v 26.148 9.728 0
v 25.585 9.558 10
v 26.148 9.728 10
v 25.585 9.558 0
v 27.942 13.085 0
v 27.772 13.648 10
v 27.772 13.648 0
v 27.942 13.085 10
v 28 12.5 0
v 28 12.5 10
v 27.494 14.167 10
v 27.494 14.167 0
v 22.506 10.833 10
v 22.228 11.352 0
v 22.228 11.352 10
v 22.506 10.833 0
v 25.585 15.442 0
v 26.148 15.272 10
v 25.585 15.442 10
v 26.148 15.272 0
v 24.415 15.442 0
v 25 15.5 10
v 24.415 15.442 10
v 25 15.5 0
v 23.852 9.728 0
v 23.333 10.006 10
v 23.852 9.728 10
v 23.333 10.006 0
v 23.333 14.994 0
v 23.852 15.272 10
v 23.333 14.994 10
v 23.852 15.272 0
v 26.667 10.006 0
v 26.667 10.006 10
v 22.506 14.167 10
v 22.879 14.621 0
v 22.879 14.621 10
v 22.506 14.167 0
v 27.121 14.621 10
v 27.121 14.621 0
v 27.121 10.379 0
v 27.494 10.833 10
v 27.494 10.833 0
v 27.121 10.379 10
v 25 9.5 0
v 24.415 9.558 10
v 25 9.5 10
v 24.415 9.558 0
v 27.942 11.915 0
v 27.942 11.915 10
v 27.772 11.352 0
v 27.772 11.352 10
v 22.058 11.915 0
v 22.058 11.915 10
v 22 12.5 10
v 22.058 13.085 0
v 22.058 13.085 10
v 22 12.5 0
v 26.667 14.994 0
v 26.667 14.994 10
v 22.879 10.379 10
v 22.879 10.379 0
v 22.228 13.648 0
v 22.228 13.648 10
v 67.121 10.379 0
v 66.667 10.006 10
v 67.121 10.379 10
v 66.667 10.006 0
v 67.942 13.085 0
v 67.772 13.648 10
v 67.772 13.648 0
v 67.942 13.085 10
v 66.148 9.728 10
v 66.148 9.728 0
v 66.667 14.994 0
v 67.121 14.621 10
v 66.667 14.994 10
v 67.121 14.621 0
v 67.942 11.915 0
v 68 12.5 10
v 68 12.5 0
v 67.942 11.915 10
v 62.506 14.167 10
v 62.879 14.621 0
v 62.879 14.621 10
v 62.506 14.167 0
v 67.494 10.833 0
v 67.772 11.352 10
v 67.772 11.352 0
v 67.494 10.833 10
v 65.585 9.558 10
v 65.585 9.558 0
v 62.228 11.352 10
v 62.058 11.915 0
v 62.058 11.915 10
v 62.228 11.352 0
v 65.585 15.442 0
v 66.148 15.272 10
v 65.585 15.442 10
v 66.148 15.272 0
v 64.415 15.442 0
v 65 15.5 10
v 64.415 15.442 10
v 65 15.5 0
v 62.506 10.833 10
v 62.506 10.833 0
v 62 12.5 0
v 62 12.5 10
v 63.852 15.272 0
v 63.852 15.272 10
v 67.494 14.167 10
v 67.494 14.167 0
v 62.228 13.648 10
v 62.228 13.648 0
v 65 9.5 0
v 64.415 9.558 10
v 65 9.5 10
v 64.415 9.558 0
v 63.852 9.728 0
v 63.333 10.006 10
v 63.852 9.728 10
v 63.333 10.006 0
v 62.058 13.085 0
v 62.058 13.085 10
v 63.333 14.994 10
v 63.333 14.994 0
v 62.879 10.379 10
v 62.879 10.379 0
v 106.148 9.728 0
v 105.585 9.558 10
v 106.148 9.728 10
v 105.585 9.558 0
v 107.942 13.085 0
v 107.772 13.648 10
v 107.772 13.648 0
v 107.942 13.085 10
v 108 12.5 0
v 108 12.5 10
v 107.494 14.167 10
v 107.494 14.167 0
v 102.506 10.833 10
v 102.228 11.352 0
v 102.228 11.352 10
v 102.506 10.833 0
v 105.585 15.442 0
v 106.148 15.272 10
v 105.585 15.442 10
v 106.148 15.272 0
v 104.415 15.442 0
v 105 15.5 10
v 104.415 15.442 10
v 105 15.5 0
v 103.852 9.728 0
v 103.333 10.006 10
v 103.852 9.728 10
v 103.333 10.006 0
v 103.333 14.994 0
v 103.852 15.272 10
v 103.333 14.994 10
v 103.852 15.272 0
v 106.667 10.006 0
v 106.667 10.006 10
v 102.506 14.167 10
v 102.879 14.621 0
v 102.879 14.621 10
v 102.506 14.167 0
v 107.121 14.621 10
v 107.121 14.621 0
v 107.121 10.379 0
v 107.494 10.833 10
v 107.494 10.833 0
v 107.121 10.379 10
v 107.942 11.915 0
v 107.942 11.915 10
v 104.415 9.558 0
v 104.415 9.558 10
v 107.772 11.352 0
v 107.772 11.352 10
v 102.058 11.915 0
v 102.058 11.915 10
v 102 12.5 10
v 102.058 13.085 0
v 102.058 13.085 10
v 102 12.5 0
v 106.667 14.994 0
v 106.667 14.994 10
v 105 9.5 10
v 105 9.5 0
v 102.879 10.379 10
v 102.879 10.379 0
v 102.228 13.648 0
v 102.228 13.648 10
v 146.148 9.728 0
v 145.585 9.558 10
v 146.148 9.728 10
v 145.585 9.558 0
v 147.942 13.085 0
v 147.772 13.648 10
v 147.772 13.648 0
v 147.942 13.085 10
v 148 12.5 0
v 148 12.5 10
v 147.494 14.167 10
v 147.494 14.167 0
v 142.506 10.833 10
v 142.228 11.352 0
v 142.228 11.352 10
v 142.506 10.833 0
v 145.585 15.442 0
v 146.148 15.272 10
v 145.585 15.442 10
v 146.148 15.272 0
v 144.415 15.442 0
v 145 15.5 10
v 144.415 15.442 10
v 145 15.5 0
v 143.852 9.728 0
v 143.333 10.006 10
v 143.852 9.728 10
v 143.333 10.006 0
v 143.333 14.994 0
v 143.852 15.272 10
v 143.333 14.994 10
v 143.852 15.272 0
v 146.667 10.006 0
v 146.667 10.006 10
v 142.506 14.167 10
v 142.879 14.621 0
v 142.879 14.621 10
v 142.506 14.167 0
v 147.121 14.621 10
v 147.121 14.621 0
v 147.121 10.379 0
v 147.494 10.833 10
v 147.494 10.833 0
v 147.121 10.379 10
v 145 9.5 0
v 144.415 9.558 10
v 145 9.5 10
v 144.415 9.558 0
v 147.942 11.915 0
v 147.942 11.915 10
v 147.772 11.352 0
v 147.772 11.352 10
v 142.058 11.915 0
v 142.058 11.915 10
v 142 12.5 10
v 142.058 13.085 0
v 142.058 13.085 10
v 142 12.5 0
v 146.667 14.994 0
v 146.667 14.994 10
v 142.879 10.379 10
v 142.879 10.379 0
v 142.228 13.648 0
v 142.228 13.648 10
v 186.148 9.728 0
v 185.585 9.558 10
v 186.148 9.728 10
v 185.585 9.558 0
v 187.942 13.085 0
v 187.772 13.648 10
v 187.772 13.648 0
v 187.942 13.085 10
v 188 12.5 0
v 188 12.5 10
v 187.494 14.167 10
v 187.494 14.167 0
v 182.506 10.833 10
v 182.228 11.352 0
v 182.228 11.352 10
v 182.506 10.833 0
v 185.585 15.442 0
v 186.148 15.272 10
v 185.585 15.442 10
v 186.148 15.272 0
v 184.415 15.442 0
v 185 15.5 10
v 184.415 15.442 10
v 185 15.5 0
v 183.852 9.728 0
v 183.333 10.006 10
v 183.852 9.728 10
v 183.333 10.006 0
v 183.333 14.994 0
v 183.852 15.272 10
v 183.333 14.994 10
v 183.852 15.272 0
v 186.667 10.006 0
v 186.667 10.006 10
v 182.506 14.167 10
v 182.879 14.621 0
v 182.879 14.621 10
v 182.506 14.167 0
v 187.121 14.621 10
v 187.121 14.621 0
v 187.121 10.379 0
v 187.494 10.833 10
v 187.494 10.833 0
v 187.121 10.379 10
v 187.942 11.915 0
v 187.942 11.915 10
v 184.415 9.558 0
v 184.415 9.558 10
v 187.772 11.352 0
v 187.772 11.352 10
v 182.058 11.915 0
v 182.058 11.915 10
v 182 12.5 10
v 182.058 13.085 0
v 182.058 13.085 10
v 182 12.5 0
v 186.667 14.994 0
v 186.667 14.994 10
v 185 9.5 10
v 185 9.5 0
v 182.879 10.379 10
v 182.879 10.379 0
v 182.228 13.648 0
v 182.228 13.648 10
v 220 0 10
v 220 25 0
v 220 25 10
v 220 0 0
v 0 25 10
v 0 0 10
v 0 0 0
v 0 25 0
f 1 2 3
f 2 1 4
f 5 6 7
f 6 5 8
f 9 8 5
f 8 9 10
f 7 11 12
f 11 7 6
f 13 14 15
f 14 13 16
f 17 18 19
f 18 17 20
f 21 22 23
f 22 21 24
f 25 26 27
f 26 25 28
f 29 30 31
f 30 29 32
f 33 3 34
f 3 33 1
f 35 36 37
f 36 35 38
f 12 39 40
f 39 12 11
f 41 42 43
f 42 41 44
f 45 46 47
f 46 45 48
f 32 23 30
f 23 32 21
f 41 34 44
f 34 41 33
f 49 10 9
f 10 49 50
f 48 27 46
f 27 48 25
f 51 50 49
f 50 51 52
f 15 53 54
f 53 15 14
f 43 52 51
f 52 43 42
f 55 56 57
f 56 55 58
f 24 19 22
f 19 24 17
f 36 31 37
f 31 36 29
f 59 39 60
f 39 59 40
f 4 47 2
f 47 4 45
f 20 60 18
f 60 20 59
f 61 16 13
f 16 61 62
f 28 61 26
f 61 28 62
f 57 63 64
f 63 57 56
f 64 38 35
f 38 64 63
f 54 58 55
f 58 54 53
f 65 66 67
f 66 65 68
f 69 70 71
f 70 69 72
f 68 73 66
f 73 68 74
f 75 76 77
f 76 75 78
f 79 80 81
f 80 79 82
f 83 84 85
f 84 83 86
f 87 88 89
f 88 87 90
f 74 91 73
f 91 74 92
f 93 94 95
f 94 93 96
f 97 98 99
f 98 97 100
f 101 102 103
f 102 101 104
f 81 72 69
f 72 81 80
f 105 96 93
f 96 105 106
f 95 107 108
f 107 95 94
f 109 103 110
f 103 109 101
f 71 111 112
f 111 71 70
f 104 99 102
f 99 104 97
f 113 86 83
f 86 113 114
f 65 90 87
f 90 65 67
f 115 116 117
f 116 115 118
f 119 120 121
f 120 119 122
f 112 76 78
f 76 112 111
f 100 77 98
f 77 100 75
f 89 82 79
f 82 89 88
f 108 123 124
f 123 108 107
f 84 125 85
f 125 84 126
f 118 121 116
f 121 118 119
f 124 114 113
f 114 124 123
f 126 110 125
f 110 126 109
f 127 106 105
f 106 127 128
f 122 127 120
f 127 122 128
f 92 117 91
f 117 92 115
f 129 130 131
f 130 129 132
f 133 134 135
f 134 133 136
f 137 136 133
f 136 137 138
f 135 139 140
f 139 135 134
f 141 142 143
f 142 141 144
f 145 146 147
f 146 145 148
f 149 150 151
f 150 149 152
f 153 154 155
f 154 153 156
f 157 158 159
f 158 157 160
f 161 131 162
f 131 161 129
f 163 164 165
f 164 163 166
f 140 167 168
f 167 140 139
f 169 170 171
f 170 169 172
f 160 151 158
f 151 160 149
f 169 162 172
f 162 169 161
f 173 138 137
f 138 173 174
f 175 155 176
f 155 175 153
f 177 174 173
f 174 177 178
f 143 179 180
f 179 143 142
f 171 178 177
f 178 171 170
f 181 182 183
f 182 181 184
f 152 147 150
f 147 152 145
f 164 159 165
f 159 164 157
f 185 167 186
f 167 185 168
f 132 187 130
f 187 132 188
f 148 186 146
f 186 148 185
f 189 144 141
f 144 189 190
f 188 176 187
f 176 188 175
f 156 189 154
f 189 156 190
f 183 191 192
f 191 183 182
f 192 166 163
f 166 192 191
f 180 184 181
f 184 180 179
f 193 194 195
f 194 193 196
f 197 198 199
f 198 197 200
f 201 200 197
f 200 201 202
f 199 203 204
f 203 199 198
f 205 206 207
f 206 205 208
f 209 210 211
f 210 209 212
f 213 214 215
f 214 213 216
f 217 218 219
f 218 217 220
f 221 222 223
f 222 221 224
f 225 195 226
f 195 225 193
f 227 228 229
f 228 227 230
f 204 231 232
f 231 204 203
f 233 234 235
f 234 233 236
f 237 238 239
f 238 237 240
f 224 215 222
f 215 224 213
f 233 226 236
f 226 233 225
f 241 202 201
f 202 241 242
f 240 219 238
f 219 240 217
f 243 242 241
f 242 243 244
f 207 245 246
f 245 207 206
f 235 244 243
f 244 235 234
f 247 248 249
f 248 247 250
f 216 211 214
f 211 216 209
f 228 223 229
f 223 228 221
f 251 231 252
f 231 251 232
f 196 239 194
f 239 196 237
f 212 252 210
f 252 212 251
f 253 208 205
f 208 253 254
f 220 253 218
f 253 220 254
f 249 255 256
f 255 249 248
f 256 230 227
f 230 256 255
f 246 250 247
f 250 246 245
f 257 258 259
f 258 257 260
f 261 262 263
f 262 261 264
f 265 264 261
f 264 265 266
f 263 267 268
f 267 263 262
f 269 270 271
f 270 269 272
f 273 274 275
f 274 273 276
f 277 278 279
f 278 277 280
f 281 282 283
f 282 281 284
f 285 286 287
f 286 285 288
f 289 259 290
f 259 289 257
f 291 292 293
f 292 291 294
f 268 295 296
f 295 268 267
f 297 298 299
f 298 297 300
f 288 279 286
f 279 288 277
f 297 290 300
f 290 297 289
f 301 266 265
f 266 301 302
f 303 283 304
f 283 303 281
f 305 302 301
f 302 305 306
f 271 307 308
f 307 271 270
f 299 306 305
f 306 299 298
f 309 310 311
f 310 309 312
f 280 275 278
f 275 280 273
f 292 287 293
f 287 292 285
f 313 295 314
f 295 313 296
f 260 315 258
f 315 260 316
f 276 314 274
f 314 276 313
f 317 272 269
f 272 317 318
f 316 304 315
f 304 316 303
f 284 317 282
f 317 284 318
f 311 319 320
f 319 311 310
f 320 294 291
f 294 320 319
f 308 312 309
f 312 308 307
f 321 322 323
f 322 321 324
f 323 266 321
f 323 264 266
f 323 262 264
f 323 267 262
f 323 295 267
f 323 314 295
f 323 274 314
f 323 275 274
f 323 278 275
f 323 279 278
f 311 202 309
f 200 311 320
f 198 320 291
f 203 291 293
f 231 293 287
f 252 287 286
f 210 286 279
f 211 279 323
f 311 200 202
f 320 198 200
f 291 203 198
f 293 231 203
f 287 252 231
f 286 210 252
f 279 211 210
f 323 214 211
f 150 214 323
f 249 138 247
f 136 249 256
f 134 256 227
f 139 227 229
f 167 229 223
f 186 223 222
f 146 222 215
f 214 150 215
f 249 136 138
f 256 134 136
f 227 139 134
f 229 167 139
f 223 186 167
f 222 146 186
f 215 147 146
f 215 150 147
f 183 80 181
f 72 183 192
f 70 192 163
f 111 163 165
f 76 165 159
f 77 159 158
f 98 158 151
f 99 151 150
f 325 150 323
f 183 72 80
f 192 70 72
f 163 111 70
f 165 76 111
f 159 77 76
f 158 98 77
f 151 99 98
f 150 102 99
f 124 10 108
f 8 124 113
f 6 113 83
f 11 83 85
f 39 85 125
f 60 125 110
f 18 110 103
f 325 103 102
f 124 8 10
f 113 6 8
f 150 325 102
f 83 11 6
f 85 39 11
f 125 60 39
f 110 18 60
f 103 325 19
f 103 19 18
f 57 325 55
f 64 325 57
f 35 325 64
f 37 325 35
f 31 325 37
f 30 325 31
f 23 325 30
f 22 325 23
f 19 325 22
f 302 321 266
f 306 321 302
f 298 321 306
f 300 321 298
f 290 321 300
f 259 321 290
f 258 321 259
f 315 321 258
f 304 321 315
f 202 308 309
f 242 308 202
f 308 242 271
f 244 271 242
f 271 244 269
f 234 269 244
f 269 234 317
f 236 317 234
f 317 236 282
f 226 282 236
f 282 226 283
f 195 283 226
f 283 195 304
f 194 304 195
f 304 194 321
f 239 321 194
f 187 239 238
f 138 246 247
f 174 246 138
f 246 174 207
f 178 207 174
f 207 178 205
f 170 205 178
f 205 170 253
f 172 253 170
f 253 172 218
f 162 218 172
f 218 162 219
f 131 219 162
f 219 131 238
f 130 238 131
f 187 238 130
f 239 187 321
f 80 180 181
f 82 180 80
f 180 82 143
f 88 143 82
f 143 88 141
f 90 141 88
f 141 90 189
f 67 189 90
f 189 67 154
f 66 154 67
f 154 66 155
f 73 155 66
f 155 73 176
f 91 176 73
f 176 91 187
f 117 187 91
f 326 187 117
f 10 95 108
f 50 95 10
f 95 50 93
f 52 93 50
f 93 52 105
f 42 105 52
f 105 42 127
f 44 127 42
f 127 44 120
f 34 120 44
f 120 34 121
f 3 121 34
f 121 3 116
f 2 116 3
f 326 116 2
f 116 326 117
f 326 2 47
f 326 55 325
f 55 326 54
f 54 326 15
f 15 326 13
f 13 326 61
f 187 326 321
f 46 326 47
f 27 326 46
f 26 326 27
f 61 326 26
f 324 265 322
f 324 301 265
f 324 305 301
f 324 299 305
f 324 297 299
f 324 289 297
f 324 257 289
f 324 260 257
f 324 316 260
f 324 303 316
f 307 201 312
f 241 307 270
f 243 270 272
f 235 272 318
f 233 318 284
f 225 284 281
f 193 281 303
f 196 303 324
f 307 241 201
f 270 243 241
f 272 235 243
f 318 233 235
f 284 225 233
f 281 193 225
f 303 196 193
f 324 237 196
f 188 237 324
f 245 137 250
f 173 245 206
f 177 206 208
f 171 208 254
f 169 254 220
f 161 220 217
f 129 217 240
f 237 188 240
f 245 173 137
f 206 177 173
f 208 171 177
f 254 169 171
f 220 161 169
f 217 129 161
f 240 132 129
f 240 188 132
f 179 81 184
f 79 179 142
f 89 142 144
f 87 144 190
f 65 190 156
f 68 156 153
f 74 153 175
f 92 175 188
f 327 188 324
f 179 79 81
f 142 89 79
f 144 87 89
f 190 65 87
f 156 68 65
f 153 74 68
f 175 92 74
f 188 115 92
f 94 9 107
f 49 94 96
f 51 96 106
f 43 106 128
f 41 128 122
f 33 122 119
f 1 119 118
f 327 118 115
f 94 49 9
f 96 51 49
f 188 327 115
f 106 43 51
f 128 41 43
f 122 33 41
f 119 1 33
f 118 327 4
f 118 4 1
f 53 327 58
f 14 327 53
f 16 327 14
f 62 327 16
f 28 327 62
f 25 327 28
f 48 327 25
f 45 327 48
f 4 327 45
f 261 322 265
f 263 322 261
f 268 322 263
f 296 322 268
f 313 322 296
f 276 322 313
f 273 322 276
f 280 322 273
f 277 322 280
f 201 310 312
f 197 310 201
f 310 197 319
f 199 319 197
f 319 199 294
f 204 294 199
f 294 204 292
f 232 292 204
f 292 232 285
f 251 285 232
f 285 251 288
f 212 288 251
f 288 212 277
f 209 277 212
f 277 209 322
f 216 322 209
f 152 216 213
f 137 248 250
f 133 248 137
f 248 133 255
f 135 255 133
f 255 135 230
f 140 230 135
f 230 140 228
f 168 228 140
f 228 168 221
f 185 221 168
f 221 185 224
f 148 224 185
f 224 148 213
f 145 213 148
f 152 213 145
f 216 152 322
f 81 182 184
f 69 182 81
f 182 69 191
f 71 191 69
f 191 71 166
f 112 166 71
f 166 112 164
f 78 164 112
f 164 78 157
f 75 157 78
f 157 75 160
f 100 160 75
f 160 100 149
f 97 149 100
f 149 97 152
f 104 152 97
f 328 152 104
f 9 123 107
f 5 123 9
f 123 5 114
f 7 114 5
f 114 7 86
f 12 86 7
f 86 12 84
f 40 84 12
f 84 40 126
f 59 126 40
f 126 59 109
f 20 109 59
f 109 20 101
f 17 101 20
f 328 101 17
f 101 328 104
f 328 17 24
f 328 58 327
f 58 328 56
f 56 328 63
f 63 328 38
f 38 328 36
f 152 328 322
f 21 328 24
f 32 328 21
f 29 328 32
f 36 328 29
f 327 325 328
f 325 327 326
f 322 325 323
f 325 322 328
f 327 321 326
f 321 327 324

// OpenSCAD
$fn = 32;

// ----------------------------------------------------------------------
// Long rail: 200-250 mm mounting rail
// ----------------------------------------------------------------------

// --- parameters (mm) ---
rail_l = 220;             // rail length, X
rail_w = 25;              // rail width, Y
rail_t = 10;              // rail thickness, Z
hole_d = 6;               // mounting hole diameter
hole_start = 25;          // first hole offset from the end
hole_pitch = 40;          // hole pitch
holes = 5;                // number of holes
fit_tol = 0.02;           // tolerance for press fits, mm
free_tol = 0.2;           // tolerance for clearance fits, mm

difference() {
  cube([rail_l, rail_w, rail_t]);
  for (i = [0 : holes - 1])
    translate([hole_start + i * hole_pitch, rail_w / 2, -1])
      cylinder(h = rail_t + 2, d = hole_d);
}
